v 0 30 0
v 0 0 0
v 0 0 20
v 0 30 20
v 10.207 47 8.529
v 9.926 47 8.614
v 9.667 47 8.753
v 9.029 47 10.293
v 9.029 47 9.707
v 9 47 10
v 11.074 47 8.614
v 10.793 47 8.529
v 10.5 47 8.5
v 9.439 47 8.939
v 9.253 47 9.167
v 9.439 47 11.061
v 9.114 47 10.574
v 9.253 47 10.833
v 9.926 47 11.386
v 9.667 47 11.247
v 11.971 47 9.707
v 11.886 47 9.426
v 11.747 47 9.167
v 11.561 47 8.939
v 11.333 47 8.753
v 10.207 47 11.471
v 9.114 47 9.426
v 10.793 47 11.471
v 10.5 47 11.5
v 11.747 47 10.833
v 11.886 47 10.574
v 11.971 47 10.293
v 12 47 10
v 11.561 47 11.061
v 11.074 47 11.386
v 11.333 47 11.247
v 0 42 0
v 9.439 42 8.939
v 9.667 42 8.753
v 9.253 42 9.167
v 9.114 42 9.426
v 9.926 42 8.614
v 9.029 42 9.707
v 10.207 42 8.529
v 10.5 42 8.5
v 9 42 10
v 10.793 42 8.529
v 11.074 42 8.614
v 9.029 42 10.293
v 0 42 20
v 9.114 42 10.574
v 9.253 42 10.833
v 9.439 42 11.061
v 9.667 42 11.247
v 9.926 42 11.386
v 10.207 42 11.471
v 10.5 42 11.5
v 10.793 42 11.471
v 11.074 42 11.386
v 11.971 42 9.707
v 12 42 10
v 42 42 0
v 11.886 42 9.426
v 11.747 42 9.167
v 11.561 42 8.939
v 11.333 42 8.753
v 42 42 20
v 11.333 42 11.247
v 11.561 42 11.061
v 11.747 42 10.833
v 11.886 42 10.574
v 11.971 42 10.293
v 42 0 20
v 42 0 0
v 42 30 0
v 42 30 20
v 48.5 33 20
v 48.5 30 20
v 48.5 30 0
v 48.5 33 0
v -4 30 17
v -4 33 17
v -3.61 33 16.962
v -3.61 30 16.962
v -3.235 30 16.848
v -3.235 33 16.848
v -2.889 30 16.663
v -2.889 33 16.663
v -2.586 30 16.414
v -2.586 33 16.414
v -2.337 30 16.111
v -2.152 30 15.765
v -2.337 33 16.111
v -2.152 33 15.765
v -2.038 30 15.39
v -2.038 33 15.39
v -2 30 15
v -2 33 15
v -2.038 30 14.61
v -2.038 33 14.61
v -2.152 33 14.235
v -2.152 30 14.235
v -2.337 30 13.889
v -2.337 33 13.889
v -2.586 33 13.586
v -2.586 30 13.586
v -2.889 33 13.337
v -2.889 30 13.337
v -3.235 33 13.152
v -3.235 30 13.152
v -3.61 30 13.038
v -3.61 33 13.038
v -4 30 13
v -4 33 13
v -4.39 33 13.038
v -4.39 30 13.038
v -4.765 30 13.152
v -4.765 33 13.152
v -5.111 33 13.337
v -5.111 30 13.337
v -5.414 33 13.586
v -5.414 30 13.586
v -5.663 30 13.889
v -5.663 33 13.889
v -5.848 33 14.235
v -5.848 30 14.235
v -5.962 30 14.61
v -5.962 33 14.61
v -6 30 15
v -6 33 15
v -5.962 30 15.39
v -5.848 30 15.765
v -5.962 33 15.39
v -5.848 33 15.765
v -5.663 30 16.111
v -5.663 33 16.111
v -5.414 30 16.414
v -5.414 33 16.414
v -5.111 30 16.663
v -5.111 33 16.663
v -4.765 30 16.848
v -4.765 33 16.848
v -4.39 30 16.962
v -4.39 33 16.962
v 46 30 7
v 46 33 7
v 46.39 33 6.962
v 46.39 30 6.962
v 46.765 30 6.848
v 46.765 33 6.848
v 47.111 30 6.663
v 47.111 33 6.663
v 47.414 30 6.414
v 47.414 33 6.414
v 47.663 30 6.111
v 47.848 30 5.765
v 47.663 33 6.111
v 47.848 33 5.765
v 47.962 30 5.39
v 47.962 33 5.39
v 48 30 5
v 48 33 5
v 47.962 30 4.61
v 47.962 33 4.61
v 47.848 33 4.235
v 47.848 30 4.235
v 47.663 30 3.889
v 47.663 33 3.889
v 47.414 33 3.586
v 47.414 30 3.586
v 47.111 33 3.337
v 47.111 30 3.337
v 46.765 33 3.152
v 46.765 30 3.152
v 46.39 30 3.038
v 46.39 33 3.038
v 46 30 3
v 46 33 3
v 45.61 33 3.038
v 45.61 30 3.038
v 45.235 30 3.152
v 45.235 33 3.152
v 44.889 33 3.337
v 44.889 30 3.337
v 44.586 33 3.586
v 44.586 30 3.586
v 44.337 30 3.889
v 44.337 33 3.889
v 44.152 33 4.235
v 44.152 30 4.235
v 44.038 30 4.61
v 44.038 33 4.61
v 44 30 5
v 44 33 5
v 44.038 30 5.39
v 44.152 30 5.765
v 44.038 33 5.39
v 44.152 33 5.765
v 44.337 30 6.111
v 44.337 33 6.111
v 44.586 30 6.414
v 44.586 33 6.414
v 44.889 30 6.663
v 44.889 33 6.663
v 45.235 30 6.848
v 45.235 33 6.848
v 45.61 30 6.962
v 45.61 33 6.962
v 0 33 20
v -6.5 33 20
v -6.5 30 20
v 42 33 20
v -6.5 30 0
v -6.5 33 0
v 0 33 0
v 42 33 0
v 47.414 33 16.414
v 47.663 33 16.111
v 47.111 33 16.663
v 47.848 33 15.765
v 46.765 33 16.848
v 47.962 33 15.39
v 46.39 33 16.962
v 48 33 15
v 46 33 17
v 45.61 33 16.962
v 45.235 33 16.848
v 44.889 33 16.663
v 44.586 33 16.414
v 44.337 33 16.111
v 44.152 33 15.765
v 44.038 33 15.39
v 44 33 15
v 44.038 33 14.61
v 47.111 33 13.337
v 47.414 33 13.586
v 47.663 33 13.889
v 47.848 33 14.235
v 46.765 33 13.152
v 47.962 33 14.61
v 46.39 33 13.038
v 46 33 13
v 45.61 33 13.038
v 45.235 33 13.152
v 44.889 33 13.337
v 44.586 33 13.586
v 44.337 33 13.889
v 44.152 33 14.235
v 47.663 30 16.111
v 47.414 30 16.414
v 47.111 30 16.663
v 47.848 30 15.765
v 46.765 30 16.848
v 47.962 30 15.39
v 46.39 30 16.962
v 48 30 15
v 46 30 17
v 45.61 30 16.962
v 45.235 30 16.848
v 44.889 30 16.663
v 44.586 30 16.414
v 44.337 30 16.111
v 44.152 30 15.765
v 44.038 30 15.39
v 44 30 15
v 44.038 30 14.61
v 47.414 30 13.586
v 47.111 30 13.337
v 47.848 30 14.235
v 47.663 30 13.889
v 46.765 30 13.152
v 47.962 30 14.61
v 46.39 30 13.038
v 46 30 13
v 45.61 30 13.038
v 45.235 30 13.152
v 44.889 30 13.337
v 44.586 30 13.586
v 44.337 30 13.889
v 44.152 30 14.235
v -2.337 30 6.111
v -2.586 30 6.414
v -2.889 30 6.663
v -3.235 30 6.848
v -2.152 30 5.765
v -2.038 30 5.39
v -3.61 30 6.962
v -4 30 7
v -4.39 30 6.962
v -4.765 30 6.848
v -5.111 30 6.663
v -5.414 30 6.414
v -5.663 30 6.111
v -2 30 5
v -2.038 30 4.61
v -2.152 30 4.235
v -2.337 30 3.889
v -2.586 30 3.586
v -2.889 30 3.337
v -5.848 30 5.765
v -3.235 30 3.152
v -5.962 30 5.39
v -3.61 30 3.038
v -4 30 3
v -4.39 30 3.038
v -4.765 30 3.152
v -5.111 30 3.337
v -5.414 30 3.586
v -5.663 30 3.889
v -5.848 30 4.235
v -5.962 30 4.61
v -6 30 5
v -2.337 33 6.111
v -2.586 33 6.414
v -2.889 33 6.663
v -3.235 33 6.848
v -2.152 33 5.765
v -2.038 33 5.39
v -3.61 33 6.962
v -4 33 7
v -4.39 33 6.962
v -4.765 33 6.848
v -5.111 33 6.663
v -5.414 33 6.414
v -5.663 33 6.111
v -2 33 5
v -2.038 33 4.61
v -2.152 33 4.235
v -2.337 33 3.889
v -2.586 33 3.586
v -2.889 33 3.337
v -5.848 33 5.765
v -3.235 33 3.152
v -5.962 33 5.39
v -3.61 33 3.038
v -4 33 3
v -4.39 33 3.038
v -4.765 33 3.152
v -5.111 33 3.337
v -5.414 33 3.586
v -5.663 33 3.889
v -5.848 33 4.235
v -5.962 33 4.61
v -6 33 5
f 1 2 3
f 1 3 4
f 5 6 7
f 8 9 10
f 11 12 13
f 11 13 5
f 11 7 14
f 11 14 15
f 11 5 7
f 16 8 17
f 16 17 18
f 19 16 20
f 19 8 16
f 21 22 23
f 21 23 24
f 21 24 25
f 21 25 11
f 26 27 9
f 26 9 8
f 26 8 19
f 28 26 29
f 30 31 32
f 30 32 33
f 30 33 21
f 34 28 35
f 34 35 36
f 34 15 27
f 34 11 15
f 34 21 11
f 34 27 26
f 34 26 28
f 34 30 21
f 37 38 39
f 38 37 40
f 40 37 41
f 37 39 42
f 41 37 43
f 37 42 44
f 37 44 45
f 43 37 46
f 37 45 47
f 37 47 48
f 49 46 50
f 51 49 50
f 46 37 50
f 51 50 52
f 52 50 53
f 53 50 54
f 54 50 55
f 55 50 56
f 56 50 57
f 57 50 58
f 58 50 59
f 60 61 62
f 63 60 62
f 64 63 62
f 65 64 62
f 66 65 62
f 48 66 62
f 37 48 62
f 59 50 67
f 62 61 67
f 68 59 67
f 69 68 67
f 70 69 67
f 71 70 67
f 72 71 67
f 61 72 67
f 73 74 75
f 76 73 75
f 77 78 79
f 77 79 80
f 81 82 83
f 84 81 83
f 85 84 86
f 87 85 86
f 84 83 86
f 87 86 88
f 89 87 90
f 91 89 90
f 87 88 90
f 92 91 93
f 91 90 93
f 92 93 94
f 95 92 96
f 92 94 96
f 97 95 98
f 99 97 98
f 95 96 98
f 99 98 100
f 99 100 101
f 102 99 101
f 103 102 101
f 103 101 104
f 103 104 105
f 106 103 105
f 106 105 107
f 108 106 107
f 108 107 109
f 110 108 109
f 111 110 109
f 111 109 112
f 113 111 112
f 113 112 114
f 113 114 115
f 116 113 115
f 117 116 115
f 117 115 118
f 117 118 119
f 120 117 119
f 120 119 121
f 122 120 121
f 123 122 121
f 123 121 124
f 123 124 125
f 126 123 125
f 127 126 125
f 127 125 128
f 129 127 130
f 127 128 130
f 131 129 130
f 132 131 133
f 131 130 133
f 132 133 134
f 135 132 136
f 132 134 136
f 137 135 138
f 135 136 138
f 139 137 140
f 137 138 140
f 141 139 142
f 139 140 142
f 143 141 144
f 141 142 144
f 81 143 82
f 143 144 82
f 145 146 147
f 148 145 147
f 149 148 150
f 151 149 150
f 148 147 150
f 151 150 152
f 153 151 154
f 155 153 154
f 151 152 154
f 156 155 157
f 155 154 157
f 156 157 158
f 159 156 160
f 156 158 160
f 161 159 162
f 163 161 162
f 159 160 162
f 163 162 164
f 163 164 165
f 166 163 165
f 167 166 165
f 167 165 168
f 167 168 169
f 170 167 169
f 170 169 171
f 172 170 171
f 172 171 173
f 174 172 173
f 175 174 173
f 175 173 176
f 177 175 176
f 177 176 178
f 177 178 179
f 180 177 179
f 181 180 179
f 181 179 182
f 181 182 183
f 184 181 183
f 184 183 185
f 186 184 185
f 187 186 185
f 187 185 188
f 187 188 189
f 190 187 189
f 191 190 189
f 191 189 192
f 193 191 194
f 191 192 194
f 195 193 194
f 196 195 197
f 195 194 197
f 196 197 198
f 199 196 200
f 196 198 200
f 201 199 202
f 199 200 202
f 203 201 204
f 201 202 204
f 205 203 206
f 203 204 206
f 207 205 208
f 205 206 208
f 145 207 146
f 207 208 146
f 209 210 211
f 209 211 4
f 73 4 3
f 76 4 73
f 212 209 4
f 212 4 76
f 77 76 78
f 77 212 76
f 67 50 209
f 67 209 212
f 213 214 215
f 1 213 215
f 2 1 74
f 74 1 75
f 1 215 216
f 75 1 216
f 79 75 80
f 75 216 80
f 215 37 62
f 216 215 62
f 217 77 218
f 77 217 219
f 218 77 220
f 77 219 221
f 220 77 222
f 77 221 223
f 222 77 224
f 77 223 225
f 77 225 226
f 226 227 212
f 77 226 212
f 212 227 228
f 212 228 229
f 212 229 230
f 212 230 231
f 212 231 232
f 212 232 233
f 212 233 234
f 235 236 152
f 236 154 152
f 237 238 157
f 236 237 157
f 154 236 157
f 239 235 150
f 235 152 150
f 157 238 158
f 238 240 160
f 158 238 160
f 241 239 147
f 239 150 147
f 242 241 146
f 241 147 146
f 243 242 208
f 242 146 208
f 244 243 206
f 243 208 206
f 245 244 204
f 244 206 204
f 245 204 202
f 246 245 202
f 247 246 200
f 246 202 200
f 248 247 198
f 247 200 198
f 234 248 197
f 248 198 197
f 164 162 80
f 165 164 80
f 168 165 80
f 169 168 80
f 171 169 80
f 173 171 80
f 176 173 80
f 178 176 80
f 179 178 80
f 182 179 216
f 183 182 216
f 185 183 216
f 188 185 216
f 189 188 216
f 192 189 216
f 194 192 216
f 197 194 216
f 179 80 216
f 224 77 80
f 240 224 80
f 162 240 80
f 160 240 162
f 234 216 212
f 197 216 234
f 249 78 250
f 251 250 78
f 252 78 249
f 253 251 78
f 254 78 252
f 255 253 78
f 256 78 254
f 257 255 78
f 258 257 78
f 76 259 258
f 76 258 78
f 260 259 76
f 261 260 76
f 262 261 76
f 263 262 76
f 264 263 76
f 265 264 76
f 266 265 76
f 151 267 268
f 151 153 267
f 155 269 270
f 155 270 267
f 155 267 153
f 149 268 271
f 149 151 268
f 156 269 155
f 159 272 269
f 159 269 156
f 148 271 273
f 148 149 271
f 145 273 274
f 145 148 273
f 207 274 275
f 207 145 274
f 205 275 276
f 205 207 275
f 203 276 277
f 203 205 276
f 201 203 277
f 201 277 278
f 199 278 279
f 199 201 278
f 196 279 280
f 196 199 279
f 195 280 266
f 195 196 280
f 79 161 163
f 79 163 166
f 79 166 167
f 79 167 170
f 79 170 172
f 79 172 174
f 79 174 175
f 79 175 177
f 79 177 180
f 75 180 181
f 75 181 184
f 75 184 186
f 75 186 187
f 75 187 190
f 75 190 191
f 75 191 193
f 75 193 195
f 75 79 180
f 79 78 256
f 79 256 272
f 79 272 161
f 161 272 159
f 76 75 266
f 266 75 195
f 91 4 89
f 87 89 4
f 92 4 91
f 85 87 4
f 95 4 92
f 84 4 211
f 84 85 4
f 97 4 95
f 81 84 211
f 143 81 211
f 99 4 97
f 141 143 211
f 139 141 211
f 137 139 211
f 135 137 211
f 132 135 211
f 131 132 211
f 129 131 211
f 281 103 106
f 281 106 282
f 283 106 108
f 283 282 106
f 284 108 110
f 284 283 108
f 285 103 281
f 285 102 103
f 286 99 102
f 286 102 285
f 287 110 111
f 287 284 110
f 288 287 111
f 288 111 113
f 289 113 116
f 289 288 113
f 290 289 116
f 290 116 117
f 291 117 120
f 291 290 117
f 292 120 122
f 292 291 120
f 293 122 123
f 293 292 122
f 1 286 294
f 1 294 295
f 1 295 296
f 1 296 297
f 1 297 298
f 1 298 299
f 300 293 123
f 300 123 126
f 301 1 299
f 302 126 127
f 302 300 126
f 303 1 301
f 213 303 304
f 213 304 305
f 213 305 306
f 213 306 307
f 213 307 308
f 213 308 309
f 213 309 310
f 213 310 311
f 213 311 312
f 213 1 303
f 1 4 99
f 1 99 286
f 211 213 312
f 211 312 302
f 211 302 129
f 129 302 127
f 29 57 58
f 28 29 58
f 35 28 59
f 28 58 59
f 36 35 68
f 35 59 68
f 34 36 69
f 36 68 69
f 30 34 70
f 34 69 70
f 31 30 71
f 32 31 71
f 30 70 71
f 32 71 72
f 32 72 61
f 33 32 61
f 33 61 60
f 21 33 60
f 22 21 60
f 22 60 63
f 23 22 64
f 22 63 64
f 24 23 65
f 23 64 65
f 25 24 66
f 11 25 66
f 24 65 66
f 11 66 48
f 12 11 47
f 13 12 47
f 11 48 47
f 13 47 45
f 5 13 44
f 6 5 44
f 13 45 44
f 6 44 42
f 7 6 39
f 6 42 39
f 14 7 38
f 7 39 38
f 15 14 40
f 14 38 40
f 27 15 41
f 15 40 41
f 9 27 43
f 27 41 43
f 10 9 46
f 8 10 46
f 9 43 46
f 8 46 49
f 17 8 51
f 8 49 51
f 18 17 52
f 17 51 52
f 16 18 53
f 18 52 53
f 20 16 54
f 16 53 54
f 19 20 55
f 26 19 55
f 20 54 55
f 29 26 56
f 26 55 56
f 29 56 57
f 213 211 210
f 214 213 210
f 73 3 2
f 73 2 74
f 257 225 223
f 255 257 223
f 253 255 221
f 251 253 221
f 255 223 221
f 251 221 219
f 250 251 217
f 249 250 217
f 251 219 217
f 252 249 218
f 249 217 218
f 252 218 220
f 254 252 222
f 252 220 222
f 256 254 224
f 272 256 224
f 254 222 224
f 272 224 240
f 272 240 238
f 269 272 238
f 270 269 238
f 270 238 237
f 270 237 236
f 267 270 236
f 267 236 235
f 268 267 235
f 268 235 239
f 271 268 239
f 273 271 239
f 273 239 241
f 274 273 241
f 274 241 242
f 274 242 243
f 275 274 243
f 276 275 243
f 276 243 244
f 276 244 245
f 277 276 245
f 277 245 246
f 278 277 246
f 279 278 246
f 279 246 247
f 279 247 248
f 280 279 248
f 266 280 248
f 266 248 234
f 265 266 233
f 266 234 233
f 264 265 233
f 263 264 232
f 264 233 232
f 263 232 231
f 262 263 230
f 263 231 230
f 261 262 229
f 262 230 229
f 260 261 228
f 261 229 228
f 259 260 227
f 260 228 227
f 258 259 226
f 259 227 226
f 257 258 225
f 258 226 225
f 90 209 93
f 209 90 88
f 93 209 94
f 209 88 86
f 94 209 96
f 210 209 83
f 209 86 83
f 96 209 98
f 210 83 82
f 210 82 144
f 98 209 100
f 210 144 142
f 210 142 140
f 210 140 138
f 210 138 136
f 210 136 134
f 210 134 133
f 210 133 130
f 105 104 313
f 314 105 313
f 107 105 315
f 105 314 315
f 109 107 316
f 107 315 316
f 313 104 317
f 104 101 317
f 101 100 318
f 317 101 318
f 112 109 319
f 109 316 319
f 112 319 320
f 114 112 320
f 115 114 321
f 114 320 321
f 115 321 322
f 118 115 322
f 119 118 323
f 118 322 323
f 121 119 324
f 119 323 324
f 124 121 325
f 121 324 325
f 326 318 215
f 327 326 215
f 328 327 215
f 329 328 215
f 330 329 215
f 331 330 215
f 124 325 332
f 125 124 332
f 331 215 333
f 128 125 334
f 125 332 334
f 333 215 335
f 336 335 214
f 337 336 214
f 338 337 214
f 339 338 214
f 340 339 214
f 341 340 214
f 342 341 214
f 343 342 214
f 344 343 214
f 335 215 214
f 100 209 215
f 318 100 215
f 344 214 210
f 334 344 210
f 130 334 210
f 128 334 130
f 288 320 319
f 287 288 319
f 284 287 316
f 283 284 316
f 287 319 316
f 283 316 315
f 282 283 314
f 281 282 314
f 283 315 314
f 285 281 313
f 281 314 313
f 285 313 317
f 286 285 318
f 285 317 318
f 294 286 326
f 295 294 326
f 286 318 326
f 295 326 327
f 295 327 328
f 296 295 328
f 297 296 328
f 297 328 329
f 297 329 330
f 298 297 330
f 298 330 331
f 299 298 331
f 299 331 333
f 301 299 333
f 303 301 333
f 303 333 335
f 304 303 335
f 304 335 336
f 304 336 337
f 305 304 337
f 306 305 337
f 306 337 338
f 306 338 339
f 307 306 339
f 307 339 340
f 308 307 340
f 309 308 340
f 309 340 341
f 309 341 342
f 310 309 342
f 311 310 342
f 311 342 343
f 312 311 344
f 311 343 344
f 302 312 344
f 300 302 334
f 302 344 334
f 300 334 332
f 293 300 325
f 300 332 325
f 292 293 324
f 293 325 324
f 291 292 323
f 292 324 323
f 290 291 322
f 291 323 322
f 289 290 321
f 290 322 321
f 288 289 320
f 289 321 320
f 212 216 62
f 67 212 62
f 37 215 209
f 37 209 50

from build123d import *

# Parameters (mm, degrees)
SKETCH_1_W                = 55
SKETCH_1_H                = 42
EXTRUDE_1_DEPTH           = 20
SKETCH_2_W                = 6.5
SKETCH_2_H                = 9
CUT_EXTRUDE_1_DEPTH       = 68.203050526
SKETCH_3_W                = 6.5
SKETCH_3_H                = 30
CUT_EXTRUDE_2_DEPTH       = 68.203050526
SKETCH_4_W                = 6.5
SKETCH_4_H                = 30
CUT_EXTRUDE_3_DEPTH       = 68.203050526
SKETCH_5_W                = 6.5
SKETCH_5_H                = 9
CUT_EXTRUDE_4_DEPTH       = 68.203050526
SKETCH_6_W                = 3
SKETCH_6_H                = 5
HOLE_WIZARD_2_0_2_1_D     = 2
HOLE_WIZARD_2_0_2_1_DEPTH = 33
CUT_EXTRUDE_START         = -5
SKETCH_9_R                = 3
SKETCH_9_R_2              = 1.5
CUT_EXTRUDE_5_DEPTH       = 5
SKETCH_10_R               = 2
CUT_EXTRUDE_6_DEPTH       = 5


with BuildPart() as part:
    # 草图1 → 凸台-拉伸1 (new body)
    with BuildSketch(Plane.XY.offset(20)):
        with Locations((21, 21)):
            Rectangle(SKETCH_1_W, SKETCH_1_H)
    extrude(amount=-EXTRUDE_1_DEPTH)

    # 草图2 → 切除-拉伸1 (cut, through all)
    with BuildSketch(Plane(origin=(0, 0, 0), x_dir=(-1, 0, 0), z_dir=(0, 0, -1))):
        with Locations((3.25, 37.5)):
            Rectangle(SKETCH_2_W, SKETCH_2_H)
    extrude(amount=-CUT_EXTRUDE_1_DEPTH, mode=Mode.SUBTRACT)

    # 草图3 → 切除-拉伸2 (cut, through all)
    with BuildSketch(Plane(origin=(0, 0, 0), x_dir=(-1, 0, 0), z_dir=(0, 0, -1))):
        with Locations((3.25, 15)):
            Rectangle(SKETCH_3_W, SKETCH_3_H)
    extrude(amount=-CUT_EXTRUDE_2_DEPTH, mode=Mode.SUBTRACT)

    # 草图4 → 切除-拉伸3 (cut, through all)
    with BuildSketch(Plane(origin=(0, 0, 0), x_dir=(-1, 0, 0), z_dir=(0, 0, -1))):
        with Locations((-45.25, 15)):
            Rectangle(SKETCH_4_W, SKETCH_4_H)
    extrude(amount=-CUT_EXTRUDE_3_DEPTH, mode=Mode.SUBTRACT)

    # 草图5 → 切除-拉伸4 (cut, through all)
    with BuildSketch(Plane(origin=(0, 0, 0), x_dir=(-1, 0, 0), z_dir=(0, 0, -1))):
        with Locations((-45.25, 37.5)):
            Rectangle(SKETCH_5_W, SKETCH_5_H)
    extrude(amount=-CUT_EXTRUDE_4_DEPTH, mode=Mode.SUBTRACT)

    # 草图6 → 旋转1 (revolve)
    with BuildSketch(Plane(origin=(0, 0, 10.000000949), x_dir=(-1, 0, 0), z_dir=(0, 0, -1)), mode=Mode.PRIVATE) as revolve_1_sk:
        with Locations((-12, 44.5)):
            Rectangle(SKETCH_6_W, SKETCH_6_H)
    revolve(revolve_1_sk.sketch.rotate(Axis((10.5, 42, 10.000000949), (0, 1, 0)), 270), axis=Axis((10.5, 42, 10.000000949), (0, 1, 0)))

    # Ø2.0 (2) 直径孔1
    with Locations(Plane(origin=(0, 33, 0), x_dir=(1, 0, 0), z_dir=(0, 1, 0))):
        with Locations((46, -15.000000809), (-4, -5.000000809), (-4, -15.000000809), (46, -5.000000809)):
            Hole(HOLE_WIZARD_2_0_2_1_D / 2, depth=HOLE_WIZARD_2_0_2_1_DEPTH)

    # 草图9 → 切除-拉伸5 (cut)
    with BuildSketch(Plane(origin=(0, 47, 0), x_dir=(1, 0, 0), z_dir=(0, 1, 0)).offset(CUT_EXTRUDE_START)):
        with Locations((10.5, -10.000000949)):
            Circle(SKETCH_9_R)
        with Locations(Location((10.5, -10.000000949, 0), (0, 0, 270))):
            Circle(SKETCH_9_R_2, mode=Mode.SUBTRACT)
    extrude(amount=CUT_EXTRUDE_5_DEPTH, mode=Mode.SUBTRACT)

    # 草图10 → 切除-拉伸6 (cut)
    with BuildSketch(Plane(origin=(0, 33, 0), x_dir=(1, 0, 0), z_dir=(0, 1, 0))):
        with Locations(Location((46, -15.000000809, 0), (0, 0, 270))):
            Circle(SKETCH_10_R)
        with Locations(Location((46, -5.000000809, 0), (0, 0, 270))):
            Circle(SKETCH_10_R)
        with Locations(Location((-4, -5.000000809, 0), (0, 0, 270))):
            Circle(SKETCH_10_R)
        with Locations(Location((-4, -15.000000809, 0), (0, 0, 270))):
            Circle(SKETCH_10_R)
    extrude(amount=-CUT_EXTRUDE_6_DEPTH, mode=Mode.SUBTRACT)


solid = part.part
